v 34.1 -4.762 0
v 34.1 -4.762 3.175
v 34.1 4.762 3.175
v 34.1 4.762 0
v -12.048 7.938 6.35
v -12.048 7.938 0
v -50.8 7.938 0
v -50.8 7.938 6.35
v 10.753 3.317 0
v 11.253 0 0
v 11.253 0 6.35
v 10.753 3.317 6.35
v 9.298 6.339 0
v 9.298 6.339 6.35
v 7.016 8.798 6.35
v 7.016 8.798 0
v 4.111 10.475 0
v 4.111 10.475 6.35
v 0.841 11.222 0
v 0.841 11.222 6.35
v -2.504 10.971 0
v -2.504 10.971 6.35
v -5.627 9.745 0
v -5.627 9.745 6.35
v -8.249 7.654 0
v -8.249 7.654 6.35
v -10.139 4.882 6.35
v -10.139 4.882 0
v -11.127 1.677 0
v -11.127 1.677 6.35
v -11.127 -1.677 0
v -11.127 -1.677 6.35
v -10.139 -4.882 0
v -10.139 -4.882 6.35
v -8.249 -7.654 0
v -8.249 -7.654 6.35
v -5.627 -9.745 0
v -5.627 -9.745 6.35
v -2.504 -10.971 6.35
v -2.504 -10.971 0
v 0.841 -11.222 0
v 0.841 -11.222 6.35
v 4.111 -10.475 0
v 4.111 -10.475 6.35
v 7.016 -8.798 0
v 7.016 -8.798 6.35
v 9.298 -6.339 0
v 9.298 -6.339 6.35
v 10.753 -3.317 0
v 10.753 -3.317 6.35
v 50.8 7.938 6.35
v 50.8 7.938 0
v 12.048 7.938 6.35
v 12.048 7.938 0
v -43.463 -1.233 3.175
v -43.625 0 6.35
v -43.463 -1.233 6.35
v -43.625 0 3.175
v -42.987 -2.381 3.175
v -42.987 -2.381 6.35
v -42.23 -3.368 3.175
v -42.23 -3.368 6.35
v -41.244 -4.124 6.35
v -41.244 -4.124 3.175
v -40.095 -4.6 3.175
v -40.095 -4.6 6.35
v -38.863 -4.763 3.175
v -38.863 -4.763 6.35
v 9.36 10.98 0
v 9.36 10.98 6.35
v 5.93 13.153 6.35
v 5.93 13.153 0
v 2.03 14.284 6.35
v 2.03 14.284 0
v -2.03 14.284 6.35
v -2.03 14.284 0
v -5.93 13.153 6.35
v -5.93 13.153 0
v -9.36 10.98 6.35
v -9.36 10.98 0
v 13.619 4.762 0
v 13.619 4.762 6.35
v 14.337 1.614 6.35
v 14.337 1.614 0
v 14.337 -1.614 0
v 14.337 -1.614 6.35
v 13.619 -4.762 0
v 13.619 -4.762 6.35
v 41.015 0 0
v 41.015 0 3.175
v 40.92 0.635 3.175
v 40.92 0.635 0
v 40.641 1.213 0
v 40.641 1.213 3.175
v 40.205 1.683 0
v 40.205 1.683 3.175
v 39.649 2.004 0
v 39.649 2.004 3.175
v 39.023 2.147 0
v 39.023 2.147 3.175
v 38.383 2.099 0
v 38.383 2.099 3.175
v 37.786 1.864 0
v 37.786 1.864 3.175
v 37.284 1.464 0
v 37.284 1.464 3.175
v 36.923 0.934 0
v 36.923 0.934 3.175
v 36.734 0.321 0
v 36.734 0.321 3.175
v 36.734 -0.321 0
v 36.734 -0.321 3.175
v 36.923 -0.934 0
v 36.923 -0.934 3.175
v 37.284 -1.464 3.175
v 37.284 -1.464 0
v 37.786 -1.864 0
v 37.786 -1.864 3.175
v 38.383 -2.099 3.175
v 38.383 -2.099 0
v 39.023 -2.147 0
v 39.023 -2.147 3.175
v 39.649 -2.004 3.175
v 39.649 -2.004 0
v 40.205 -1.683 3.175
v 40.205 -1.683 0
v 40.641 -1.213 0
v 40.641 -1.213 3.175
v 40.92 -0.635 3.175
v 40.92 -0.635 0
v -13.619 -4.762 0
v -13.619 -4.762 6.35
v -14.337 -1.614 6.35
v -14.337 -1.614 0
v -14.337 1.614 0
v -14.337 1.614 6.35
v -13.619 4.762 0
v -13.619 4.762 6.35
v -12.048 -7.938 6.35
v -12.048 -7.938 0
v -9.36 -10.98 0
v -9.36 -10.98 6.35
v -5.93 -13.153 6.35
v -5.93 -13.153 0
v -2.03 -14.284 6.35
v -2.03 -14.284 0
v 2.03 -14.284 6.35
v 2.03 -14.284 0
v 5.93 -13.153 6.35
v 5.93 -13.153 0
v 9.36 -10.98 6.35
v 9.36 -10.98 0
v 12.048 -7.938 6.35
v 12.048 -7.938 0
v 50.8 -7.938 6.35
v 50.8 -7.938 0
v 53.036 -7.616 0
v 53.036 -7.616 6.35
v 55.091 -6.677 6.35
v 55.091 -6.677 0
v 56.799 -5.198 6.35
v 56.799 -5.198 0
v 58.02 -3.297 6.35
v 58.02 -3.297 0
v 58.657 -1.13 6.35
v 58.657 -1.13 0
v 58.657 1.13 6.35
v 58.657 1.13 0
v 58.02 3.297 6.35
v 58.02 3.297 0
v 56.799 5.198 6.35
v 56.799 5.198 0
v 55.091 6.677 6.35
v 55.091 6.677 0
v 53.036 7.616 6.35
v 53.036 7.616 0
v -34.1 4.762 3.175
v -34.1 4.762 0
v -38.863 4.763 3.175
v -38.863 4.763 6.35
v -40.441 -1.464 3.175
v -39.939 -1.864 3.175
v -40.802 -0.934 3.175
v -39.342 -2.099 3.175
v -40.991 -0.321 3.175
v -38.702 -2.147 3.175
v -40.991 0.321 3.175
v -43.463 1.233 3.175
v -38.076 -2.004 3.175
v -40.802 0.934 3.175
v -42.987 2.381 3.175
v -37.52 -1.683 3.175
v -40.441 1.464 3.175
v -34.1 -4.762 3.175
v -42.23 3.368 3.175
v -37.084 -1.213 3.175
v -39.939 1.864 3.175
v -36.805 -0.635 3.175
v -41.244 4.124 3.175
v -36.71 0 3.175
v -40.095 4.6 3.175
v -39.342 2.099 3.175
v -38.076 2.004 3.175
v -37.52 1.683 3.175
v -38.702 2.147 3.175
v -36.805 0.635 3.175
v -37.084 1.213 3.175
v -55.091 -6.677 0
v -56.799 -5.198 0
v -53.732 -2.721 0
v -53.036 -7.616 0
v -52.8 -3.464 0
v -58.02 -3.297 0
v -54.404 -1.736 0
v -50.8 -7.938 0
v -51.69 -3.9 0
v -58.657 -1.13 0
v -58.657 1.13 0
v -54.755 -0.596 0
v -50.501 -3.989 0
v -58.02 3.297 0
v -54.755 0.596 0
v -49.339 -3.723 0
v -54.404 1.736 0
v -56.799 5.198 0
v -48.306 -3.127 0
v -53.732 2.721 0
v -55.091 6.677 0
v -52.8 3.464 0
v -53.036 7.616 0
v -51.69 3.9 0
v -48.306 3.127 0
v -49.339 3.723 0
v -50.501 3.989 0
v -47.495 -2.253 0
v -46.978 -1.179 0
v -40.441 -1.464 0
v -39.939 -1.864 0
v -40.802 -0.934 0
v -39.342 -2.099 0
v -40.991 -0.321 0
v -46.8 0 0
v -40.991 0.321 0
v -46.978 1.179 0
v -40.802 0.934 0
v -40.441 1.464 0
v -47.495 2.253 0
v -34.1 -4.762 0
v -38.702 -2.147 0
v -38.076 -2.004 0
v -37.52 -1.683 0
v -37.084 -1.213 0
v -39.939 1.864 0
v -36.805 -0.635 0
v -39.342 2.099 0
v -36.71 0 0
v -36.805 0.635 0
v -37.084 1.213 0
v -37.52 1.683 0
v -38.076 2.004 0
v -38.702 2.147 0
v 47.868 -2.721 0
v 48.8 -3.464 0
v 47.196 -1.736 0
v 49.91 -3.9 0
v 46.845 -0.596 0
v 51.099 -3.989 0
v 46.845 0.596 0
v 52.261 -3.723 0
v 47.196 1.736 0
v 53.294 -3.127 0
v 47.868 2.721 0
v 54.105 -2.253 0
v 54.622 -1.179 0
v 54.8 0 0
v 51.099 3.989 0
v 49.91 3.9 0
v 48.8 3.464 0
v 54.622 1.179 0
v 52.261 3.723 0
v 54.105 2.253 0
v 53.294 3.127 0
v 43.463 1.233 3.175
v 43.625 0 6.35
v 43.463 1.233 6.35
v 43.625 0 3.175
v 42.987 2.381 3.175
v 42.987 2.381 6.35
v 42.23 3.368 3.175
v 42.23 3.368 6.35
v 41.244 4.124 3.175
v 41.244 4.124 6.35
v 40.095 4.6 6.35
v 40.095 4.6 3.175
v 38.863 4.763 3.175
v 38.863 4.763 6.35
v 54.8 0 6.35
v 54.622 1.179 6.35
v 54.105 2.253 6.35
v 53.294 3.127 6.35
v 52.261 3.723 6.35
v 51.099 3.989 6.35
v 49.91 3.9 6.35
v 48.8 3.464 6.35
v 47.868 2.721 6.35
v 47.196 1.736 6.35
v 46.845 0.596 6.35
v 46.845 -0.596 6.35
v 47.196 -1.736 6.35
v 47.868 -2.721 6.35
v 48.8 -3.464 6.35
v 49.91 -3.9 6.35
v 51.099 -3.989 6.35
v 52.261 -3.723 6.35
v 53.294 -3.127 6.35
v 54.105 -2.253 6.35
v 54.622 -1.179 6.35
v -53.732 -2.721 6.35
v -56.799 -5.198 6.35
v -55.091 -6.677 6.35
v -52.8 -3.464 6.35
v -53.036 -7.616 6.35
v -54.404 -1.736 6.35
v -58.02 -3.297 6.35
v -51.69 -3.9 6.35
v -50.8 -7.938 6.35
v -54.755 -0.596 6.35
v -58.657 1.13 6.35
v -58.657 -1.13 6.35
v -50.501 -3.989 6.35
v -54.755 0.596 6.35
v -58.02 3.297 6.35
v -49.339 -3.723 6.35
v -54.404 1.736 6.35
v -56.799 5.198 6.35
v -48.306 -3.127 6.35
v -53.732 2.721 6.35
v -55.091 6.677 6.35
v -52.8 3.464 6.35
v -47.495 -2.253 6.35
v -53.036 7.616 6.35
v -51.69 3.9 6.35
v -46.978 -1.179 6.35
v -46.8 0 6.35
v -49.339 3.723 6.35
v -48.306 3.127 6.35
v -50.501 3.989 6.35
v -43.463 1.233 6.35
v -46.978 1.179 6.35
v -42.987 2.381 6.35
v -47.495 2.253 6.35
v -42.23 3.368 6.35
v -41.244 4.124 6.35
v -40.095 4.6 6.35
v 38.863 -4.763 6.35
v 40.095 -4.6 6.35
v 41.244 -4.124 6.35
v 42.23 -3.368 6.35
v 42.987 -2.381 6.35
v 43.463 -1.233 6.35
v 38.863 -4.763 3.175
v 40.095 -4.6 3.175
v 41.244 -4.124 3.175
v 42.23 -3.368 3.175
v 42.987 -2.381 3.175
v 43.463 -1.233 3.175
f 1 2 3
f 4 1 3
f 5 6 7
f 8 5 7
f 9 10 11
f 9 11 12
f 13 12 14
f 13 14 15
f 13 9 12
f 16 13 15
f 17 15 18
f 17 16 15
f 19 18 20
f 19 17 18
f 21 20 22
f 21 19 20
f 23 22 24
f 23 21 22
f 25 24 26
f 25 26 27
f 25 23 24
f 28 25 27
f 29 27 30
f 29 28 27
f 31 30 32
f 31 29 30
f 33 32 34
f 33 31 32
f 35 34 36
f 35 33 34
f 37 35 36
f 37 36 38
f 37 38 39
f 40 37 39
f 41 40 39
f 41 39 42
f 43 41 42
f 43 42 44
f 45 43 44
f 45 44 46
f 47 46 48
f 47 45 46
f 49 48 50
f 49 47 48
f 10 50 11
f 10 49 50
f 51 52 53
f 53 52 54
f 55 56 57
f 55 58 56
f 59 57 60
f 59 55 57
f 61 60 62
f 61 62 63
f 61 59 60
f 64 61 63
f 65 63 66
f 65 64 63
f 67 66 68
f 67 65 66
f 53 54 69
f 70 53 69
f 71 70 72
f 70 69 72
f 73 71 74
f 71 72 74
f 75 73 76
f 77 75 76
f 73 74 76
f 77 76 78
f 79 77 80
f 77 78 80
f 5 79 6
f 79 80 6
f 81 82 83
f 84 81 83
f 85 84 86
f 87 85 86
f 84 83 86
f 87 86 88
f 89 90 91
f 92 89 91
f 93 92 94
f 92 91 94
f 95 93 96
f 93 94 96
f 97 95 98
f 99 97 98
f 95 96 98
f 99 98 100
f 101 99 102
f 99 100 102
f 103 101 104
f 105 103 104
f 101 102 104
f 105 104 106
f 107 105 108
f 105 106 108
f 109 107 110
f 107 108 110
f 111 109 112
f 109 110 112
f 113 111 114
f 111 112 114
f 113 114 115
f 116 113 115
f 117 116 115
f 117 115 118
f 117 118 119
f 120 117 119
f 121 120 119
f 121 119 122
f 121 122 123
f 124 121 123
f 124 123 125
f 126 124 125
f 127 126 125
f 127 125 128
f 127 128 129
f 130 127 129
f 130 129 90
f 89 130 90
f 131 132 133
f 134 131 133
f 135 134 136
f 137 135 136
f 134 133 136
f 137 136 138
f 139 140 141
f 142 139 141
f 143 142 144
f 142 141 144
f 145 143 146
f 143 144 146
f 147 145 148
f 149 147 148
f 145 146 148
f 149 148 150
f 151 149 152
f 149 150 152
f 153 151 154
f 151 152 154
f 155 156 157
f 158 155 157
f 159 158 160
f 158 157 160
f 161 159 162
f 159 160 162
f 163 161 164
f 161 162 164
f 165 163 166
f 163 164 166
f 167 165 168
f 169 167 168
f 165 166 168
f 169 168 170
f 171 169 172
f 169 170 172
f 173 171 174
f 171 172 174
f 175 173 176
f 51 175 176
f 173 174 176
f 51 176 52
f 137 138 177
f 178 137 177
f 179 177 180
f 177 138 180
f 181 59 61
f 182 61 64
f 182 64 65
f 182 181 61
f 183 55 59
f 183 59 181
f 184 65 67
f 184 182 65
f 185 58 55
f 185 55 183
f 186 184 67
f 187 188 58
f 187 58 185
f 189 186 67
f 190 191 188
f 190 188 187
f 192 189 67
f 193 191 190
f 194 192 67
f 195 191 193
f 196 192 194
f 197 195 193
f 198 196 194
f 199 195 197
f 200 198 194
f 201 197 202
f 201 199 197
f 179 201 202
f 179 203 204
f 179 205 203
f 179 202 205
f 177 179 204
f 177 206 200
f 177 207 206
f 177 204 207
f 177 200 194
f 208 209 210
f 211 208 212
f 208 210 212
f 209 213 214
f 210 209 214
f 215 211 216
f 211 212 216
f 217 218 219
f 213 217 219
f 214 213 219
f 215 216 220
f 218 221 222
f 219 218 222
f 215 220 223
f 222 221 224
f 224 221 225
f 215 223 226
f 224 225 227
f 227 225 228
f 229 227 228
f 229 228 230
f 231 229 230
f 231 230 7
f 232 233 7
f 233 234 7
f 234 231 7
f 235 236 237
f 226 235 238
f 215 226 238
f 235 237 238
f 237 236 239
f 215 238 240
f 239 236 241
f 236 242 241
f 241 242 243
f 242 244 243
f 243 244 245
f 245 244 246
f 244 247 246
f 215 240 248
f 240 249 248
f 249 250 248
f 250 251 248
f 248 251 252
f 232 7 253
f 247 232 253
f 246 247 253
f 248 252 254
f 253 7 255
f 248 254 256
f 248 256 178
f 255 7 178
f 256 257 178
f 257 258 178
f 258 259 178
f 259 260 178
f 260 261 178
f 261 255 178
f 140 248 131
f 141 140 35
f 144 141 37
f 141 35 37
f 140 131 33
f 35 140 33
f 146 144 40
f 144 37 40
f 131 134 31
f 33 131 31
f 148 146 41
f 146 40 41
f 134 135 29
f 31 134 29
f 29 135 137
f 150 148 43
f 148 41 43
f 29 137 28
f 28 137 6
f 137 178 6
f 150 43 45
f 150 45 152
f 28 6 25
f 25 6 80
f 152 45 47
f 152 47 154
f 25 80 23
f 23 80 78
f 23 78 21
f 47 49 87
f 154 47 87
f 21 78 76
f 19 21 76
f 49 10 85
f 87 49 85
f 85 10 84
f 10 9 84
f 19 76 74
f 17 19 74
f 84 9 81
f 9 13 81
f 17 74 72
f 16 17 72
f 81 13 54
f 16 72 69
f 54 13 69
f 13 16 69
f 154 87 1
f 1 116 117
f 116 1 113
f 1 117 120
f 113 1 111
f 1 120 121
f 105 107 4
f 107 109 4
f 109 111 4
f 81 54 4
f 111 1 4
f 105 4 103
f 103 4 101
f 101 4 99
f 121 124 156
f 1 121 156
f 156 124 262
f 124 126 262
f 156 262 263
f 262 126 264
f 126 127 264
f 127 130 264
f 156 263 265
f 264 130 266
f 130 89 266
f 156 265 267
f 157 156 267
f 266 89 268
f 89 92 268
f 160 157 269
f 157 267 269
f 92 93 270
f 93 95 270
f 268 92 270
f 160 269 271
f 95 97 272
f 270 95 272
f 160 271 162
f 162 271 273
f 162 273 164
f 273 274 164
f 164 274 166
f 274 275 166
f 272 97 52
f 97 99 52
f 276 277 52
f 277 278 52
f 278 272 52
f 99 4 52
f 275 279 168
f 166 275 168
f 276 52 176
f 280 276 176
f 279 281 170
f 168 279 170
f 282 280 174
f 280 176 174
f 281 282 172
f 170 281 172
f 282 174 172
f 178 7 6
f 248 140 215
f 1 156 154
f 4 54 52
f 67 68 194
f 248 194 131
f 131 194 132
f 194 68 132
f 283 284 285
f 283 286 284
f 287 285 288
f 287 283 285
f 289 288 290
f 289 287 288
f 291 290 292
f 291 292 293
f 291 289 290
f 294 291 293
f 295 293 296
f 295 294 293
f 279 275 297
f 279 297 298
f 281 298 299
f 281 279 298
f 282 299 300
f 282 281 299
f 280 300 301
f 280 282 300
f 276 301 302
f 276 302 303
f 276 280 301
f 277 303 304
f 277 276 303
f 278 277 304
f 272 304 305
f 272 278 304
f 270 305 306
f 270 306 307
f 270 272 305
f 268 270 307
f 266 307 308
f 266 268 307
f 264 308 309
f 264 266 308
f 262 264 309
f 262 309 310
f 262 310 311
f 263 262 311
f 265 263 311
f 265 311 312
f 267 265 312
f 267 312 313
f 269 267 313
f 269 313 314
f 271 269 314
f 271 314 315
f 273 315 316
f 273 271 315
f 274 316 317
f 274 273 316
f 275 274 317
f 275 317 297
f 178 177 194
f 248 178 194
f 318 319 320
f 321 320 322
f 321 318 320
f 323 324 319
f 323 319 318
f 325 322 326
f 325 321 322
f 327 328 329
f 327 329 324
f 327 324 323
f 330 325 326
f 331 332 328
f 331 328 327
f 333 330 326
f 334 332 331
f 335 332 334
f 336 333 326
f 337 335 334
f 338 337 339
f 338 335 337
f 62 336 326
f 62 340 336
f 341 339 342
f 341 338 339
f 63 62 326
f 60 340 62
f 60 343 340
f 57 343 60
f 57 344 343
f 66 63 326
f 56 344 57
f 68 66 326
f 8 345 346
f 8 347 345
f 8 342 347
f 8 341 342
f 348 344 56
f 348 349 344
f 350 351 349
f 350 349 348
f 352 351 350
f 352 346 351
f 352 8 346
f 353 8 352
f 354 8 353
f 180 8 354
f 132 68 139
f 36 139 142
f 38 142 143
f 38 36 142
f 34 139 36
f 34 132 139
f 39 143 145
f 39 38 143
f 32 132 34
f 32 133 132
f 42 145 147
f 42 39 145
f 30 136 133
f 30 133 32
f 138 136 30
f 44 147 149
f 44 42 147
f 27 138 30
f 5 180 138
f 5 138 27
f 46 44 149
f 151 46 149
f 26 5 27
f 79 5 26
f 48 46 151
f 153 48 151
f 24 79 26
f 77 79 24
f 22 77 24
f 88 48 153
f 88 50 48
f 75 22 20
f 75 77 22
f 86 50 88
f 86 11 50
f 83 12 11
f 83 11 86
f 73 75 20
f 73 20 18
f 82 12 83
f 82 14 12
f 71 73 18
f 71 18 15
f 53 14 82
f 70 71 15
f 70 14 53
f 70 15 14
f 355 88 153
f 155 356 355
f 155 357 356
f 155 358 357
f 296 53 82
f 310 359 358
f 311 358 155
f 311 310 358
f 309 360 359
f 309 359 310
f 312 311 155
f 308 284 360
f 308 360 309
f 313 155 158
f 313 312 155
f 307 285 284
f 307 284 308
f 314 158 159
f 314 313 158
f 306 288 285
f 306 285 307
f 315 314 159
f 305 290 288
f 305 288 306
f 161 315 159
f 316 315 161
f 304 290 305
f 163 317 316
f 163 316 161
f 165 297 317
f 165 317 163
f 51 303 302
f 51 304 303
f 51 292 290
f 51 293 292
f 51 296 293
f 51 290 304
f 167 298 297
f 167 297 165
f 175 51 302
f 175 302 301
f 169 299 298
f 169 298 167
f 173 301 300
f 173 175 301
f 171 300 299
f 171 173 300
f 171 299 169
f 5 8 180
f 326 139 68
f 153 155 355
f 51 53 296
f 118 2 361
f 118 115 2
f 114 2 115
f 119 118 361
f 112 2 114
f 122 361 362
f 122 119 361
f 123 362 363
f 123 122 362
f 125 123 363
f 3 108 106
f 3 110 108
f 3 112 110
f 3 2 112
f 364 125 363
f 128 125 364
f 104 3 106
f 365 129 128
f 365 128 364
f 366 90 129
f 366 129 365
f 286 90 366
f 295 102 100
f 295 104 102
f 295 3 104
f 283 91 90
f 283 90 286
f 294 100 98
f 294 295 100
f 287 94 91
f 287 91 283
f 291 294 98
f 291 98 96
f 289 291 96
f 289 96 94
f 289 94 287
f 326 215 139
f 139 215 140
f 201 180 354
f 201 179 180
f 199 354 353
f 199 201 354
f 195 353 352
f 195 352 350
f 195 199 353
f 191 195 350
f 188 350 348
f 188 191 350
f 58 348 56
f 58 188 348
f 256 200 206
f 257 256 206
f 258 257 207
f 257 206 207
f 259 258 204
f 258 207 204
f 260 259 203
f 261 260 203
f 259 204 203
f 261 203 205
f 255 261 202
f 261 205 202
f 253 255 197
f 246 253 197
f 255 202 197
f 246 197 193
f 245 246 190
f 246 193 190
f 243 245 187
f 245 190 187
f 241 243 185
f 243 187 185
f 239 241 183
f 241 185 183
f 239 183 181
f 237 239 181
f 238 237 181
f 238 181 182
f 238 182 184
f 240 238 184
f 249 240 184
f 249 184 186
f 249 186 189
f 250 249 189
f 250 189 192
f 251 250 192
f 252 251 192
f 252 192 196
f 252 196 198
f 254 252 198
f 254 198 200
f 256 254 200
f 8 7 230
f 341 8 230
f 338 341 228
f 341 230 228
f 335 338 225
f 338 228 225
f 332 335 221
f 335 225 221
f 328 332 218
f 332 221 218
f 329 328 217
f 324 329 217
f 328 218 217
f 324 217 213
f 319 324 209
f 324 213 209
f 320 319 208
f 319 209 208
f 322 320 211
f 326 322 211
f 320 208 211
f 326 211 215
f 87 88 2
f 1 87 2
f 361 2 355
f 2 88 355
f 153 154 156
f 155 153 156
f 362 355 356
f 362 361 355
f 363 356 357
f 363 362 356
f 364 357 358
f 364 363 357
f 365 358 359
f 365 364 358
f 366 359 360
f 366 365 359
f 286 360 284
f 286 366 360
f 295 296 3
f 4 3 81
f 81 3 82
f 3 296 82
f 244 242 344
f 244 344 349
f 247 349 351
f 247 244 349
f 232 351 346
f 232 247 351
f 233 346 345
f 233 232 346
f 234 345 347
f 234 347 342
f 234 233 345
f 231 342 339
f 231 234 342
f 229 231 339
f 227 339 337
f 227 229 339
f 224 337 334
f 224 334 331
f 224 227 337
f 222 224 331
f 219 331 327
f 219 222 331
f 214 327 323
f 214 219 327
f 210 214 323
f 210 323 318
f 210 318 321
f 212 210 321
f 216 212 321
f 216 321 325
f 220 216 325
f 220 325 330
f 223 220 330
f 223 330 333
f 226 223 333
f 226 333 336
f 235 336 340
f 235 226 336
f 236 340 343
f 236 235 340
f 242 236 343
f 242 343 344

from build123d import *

# Parameters (mm, degrees)
F0_R     = 4
F0_R_2   = 11.2530001
F1_DEPTH = 6.35
F2_R     = 2.15265
F3_DEPTH = 6.35
F4_W     = 9.525
F4_H     = 9.525
F5_DEPTH = 3.175
F6_R     = 4.76249


# Not quite as in the source:
# - a fillet or chamfer is up to 0.001 mm smaller than in the source, because OpenCascade refuses the exact size


with BuildPart() as f1:
    # F0 (on Top) → F1 (new body)
    with BuildSketch(Plane.XY):
        with BuildLine():
            Line((-12.0483725306, 7.9375), (-50.8, 7.9375))
            ThreePointArc((-50.8, 7.9375), (-58.7375, 0), (-50.8, -7.9375))
            Line((-50.8, -7.9375), (-12.0483725306, -7.9375))
            ThreePointArc((-12.0483725306, -7.9375), (0, -14.4280001), (12.0483725306, -7.9375))
            Line((12.0483725306, -7.9375), (50.8, -7.9375))
            ThreePointArc((50.8, -7.9375), (58.7375, 0), (50.8, 7.9375))
            Line((50.8, 7.9375), (12.0483725306, 7.9375))
            ThreePointArc((12.0483725306, 7.9375), (0, 14.4280001), (-12.0483725306, 7.9375))
        make_face()
        with Locations((-50.8, 0)):
            Circle(F0_R, mode=Mode.SUBTRACT)
        Circle(F0_R_2, mode=Mode.SUBTRACT)
        with Locations((50.8, 0)):
            Circle(F0_R, mode=Mode.SUBTRACT)
    extrude(amount=F1_DEPTH)

    # F2 (on face) → F3 (cut, through all)
    with BuildSketch(Plane.XY.offset(6.35)):
        with BuildLine():
            ThreePointArc((-13.6193164526, -4.7625), (-14.4280001, 0), (-13.6193164526, 4.7625))
            Line((-13.6193164526, 4.7625), (-34.1, 4.7625))
            Line((-34.1, 4.7625), (-34.1, -4.7625))
            Line((-34.1, -4.7625), (-13.6193164526, -4.7625))
        make_face()
        with BuildLine():
            Line((34.1, 4.7625), (13.6193164526, 4.7625))
            ThreePointArc((13.6193164526, 4.7625), (14.4280001, 0), (13.6193164526, -4.7625))
            Line((13.6193164526, -4.7625), (34.1, -4.7625))
            Line((34.1, -4.7625), (34.1, 4.7625))
        make_face()
        with Locations((-38.8625, 0)):
            Circle(F2_R)
        with Locations((38.8625, 0)):
            Circle(F2_R)
    extrude(amount=-F3_DEPTH, mode=Mode.SUBTRACT)

    # F4 (on face) → F5 (cut)
    with BuildSketch(Plane.XY.offset(6.35)):
        with Locations((-38.8625, 0)):
            Rectangle(F4_W, F4_H)
        with Locations((38.8625, 0)):
            Rectangle(F4_W, F4_H)
    extrude(amount=-F5_DEPTH, mode=Mode.SUBTRACT)

    # F6 (radius 4.7625 in the source; OpenCascade refuses exactly that, so slightly less here)
    f6_edges = [f1.edges().sort_by_distance(p)[0] for p in [
        (-43.625, 4.7625, 4.7625),
        (-43.625, -4.7625, 4.7625),
        (43.625, 4.7625, 4.7625),
        (43.625, -4.7625, 4.7625),
    ]]
    fillet(f6_edges, radius=F6_R)


solid = f1.part
